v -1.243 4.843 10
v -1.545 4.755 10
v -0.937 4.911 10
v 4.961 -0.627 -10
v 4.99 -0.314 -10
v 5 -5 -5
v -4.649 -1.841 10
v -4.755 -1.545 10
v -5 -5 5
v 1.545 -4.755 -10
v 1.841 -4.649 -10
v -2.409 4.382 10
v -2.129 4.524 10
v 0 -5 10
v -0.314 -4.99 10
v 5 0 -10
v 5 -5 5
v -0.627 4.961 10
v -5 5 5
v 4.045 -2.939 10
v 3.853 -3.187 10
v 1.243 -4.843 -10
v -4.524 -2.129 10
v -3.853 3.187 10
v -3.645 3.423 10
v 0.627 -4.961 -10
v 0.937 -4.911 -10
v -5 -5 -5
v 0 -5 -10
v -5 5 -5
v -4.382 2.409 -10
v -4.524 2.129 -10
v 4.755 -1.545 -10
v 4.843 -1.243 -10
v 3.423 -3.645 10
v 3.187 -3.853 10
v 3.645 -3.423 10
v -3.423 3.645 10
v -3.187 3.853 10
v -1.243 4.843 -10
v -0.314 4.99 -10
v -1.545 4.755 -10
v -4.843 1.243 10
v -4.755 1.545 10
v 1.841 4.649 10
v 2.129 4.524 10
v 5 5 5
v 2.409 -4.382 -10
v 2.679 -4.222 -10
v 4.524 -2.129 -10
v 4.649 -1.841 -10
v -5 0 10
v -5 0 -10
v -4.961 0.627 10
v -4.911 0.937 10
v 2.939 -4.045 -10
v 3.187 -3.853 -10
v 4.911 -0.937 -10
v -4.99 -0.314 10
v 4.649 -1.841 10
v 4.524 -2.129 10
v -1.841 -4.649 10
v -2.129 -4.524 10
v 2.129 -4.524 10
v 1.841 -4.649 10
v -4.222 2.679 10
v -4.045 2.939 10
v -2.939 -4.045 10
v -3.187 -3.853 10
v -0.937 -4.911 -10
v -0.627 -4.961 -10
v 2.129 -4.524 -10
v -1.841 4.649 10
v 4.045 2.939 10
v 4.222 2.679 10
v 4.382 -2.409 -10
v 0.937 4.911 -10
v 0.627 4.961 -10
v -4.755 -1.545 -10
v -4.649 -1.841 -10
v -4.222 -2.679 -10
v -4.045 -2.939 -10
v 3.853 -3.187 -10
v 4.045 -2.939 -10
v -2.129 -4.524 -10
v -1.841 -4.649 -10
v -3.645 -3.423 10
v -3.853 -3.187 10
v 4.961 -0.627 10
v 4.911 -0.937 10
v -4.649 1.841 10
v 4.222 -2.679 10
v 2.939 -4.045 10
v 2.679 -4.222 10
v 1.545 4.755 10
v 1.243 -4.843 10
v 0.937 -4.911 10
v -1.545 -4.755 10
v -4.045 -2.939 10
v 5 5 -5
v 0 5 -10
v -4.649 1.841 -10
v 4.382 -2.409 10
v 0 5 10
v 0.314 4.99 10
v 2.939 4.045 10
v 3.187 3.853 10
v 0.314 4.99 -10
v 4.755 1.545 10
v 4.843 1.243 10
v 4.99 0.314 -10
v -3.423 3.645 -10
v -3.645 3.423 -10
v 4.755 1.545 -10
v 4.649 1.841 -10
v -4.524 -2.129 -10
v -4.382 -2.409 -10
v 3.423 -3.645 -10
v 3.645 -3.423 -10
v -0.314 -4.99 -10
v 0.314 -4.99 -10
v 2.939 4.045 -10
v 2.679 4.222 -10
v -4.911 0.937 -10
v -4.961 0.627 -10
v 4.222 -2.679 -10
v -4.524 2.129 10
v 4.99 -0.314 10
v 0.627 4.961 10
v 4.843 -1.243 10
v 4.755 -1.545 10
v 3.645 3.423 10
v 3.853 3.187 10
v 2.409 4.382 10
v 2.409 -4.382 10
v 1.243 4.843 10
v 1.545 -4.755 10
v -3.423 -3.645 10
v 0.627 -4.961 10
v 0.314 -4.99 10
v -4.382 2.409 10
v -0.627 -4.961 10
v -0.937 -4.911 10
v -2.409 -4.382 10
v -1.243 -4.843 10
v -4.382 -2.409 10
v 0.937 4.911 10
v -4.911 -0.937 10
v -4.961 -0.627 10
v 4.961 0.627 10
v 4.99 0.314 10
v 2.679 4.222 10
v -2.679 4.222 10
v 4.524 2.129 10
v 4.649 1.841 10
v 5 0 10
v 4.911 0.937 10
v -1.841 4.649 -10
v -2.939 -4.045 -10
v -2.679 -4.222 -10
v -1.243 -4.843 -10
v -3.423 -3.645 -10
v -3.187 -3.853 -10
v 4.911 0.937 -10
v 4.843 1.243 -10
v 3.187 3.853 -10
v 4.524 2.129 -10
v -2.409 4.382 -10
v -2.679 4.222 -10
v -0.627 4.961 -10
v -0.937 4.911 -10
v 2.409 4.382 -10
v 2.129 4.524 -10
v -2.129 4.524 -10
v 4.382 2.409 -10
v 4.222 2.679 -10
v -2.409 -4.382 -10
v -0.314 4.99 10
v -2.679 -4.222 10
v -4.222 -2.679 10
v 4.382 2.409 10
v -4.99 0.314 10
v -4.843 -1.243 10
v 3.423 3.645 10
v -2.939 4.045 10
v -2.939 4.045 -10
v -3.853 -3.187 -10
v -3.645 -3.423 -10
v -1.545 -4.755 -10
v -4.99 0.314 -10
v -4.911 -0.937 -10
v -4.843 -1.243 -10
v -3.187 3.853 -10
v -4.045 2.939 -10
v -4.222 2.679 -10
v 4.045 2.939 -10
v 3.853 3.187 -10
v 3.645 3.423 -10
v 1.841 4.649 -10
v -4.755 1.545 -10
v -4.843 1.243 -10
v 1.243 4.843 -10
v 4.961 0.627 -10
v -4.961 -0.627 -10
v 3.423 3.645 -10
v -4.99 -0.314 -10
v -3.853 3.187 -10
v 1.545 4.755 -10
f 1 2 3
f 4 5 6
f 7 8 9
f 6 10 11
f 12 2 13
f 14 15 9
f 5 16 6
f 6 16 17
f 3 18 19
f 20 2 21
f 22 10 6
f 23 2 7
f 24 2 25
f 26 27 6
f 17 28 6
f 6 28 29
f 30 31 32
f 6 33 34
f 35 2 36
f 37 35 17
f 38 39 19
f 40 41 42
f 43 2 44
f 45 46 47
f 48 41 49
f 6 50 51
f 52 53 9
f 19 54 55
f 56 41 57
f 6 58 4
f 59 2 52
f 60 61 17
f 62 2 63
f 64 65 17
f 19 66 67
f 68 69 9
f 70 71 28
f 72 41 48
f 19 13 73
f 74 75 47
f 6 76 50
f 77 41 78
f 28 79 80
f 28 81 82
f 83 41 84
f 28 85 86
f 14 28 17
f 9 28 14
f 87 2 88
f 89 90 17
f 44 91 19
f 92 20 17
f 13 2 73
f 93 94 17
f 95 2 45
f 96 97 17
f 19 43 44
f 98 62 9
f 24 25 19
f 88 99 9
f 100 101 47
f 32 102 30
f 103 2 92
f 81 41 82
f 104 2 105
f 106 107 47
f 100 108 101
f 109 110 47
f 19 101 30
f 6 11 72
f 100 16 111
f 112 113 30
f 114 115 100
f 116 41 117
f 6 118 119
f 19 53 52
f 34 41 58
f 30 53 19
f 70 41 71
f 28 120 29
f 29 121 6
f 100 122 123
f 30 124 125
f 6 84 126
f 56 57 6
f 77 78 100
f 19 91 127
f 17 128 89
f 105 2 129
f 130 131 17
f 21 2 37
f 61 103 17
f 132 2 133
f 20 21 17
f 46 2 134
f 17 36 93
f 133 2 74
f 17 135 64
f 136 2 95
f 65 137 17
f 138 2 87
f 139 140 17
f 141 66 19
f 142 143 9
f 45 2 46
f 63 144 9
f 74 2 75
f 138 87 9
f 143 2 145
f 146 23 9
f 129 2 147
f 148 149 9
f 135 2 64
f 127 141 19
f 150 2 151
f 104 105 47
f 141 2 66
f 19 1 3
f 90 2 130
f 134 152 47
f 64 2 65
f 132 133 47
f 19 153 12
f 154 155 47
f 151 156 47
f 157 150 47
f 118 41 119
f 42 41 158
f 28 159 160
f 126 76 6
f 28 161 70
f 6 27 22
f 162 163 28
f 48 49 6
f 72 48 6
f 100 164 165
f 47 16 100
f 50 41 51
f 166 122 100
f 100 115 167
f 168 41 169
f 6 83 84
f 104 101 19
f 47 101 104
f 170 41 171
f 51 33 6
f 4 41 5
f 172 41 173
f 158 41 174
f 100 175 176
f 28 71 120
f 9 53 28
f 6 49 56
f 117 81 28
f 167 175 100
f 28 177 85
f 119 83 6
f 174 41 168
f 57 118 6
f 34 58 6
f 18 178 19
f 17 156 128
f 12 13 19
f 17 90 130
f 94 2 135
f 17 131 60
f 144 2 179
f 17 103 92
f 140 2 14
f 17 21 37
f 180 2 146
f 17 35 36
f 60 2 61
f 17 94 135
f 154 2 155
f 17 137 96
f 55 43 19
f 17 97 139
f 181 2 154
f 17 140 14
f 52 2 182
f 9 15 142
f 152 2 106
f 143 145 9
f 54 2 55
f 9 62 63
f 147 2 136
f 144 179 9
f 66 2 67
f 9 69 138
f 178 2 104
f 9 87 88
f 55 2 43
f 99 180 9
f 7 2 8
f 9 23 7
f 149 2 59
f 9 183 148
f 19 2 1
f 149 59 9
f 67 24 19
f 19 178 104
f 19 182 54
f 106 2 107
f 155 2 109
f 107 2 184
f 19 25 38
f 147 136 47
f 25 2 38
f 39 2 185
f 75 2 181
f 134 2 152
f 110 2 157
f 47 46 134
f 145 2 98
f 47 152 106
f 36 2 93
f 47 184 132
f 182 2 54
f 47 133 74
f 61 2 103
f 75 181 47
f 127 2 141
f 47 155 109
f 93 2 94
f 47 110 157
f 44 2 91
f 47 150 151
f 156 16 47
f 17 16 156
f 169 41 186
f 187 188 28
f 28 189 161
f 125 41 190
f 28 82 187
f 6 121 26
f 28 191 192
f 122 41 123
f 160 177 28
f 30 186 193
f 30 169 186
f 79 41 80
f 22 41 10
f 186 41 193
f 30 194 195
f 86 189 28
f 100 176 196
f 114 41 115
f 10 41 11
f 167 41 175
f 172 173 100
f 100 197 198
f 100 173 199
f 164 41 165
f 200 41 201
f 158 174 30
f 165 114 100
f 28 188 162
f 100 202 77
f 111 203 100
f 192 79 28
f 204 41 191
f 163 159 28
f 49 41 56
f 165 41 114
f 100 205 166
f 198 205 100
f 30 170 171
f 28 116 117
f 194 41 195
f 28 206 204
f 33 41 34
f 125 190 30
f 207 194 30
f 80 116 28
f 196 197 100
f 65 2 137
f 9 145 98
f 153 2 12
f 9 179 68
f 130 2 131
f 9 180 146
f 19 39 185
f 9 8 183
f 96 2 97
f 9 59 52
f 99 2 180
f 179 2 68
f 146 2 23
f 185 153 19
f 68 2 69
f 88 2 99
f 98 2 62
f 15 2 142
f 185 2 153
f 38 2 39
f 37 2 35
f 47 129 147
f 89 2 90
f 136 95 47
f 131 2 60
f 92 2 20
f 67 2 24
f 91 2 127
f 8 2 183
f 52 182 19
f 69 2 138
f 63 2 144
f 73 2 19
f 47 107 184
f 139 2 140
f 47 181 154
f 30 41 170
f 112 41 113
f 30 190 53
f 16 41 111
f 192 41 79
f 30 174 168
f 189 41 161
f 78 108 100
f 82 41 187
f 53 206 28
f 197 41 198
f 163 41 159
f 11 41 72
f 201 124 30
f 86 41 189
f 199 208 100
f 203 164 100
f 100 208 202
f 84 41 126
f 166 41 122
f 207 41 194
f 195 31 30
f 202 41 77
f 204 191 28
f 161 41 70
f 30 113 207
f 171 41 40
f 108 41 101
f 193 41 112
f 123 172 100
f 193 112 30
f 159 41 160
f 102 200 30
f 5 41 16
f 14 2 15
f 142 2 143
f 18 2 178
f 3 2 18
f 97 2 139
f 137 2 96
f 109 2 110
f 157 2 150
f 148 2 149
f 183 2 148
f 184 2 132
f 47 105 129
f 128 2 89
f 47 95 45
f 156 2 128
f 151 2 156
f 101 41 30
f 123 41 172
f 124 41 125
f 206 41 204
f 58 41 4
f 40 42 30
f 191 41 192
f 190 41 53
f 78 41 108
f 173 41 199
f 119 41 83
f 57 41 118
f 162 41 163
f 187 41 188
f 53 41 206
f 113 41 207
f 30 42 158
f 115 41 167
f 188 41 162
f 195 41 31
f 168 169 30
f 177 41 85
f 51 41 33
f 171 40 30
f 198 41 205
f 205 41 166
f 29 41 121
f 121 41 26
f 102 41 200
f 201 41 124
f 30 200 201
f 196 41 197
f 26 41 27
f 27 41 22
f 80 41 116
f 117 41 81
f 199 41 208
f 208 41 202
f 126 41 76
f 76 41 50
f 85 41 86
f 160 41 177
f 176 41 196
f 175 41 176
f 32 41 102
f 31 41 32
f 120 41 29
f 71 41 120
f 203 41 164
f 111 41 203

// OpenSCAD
$fn = 100;
hull() {
    cube([10, 10, 10], center = true);
    cylinder(h = 20, r1 = 5, r2 = 5, center = true);
}
